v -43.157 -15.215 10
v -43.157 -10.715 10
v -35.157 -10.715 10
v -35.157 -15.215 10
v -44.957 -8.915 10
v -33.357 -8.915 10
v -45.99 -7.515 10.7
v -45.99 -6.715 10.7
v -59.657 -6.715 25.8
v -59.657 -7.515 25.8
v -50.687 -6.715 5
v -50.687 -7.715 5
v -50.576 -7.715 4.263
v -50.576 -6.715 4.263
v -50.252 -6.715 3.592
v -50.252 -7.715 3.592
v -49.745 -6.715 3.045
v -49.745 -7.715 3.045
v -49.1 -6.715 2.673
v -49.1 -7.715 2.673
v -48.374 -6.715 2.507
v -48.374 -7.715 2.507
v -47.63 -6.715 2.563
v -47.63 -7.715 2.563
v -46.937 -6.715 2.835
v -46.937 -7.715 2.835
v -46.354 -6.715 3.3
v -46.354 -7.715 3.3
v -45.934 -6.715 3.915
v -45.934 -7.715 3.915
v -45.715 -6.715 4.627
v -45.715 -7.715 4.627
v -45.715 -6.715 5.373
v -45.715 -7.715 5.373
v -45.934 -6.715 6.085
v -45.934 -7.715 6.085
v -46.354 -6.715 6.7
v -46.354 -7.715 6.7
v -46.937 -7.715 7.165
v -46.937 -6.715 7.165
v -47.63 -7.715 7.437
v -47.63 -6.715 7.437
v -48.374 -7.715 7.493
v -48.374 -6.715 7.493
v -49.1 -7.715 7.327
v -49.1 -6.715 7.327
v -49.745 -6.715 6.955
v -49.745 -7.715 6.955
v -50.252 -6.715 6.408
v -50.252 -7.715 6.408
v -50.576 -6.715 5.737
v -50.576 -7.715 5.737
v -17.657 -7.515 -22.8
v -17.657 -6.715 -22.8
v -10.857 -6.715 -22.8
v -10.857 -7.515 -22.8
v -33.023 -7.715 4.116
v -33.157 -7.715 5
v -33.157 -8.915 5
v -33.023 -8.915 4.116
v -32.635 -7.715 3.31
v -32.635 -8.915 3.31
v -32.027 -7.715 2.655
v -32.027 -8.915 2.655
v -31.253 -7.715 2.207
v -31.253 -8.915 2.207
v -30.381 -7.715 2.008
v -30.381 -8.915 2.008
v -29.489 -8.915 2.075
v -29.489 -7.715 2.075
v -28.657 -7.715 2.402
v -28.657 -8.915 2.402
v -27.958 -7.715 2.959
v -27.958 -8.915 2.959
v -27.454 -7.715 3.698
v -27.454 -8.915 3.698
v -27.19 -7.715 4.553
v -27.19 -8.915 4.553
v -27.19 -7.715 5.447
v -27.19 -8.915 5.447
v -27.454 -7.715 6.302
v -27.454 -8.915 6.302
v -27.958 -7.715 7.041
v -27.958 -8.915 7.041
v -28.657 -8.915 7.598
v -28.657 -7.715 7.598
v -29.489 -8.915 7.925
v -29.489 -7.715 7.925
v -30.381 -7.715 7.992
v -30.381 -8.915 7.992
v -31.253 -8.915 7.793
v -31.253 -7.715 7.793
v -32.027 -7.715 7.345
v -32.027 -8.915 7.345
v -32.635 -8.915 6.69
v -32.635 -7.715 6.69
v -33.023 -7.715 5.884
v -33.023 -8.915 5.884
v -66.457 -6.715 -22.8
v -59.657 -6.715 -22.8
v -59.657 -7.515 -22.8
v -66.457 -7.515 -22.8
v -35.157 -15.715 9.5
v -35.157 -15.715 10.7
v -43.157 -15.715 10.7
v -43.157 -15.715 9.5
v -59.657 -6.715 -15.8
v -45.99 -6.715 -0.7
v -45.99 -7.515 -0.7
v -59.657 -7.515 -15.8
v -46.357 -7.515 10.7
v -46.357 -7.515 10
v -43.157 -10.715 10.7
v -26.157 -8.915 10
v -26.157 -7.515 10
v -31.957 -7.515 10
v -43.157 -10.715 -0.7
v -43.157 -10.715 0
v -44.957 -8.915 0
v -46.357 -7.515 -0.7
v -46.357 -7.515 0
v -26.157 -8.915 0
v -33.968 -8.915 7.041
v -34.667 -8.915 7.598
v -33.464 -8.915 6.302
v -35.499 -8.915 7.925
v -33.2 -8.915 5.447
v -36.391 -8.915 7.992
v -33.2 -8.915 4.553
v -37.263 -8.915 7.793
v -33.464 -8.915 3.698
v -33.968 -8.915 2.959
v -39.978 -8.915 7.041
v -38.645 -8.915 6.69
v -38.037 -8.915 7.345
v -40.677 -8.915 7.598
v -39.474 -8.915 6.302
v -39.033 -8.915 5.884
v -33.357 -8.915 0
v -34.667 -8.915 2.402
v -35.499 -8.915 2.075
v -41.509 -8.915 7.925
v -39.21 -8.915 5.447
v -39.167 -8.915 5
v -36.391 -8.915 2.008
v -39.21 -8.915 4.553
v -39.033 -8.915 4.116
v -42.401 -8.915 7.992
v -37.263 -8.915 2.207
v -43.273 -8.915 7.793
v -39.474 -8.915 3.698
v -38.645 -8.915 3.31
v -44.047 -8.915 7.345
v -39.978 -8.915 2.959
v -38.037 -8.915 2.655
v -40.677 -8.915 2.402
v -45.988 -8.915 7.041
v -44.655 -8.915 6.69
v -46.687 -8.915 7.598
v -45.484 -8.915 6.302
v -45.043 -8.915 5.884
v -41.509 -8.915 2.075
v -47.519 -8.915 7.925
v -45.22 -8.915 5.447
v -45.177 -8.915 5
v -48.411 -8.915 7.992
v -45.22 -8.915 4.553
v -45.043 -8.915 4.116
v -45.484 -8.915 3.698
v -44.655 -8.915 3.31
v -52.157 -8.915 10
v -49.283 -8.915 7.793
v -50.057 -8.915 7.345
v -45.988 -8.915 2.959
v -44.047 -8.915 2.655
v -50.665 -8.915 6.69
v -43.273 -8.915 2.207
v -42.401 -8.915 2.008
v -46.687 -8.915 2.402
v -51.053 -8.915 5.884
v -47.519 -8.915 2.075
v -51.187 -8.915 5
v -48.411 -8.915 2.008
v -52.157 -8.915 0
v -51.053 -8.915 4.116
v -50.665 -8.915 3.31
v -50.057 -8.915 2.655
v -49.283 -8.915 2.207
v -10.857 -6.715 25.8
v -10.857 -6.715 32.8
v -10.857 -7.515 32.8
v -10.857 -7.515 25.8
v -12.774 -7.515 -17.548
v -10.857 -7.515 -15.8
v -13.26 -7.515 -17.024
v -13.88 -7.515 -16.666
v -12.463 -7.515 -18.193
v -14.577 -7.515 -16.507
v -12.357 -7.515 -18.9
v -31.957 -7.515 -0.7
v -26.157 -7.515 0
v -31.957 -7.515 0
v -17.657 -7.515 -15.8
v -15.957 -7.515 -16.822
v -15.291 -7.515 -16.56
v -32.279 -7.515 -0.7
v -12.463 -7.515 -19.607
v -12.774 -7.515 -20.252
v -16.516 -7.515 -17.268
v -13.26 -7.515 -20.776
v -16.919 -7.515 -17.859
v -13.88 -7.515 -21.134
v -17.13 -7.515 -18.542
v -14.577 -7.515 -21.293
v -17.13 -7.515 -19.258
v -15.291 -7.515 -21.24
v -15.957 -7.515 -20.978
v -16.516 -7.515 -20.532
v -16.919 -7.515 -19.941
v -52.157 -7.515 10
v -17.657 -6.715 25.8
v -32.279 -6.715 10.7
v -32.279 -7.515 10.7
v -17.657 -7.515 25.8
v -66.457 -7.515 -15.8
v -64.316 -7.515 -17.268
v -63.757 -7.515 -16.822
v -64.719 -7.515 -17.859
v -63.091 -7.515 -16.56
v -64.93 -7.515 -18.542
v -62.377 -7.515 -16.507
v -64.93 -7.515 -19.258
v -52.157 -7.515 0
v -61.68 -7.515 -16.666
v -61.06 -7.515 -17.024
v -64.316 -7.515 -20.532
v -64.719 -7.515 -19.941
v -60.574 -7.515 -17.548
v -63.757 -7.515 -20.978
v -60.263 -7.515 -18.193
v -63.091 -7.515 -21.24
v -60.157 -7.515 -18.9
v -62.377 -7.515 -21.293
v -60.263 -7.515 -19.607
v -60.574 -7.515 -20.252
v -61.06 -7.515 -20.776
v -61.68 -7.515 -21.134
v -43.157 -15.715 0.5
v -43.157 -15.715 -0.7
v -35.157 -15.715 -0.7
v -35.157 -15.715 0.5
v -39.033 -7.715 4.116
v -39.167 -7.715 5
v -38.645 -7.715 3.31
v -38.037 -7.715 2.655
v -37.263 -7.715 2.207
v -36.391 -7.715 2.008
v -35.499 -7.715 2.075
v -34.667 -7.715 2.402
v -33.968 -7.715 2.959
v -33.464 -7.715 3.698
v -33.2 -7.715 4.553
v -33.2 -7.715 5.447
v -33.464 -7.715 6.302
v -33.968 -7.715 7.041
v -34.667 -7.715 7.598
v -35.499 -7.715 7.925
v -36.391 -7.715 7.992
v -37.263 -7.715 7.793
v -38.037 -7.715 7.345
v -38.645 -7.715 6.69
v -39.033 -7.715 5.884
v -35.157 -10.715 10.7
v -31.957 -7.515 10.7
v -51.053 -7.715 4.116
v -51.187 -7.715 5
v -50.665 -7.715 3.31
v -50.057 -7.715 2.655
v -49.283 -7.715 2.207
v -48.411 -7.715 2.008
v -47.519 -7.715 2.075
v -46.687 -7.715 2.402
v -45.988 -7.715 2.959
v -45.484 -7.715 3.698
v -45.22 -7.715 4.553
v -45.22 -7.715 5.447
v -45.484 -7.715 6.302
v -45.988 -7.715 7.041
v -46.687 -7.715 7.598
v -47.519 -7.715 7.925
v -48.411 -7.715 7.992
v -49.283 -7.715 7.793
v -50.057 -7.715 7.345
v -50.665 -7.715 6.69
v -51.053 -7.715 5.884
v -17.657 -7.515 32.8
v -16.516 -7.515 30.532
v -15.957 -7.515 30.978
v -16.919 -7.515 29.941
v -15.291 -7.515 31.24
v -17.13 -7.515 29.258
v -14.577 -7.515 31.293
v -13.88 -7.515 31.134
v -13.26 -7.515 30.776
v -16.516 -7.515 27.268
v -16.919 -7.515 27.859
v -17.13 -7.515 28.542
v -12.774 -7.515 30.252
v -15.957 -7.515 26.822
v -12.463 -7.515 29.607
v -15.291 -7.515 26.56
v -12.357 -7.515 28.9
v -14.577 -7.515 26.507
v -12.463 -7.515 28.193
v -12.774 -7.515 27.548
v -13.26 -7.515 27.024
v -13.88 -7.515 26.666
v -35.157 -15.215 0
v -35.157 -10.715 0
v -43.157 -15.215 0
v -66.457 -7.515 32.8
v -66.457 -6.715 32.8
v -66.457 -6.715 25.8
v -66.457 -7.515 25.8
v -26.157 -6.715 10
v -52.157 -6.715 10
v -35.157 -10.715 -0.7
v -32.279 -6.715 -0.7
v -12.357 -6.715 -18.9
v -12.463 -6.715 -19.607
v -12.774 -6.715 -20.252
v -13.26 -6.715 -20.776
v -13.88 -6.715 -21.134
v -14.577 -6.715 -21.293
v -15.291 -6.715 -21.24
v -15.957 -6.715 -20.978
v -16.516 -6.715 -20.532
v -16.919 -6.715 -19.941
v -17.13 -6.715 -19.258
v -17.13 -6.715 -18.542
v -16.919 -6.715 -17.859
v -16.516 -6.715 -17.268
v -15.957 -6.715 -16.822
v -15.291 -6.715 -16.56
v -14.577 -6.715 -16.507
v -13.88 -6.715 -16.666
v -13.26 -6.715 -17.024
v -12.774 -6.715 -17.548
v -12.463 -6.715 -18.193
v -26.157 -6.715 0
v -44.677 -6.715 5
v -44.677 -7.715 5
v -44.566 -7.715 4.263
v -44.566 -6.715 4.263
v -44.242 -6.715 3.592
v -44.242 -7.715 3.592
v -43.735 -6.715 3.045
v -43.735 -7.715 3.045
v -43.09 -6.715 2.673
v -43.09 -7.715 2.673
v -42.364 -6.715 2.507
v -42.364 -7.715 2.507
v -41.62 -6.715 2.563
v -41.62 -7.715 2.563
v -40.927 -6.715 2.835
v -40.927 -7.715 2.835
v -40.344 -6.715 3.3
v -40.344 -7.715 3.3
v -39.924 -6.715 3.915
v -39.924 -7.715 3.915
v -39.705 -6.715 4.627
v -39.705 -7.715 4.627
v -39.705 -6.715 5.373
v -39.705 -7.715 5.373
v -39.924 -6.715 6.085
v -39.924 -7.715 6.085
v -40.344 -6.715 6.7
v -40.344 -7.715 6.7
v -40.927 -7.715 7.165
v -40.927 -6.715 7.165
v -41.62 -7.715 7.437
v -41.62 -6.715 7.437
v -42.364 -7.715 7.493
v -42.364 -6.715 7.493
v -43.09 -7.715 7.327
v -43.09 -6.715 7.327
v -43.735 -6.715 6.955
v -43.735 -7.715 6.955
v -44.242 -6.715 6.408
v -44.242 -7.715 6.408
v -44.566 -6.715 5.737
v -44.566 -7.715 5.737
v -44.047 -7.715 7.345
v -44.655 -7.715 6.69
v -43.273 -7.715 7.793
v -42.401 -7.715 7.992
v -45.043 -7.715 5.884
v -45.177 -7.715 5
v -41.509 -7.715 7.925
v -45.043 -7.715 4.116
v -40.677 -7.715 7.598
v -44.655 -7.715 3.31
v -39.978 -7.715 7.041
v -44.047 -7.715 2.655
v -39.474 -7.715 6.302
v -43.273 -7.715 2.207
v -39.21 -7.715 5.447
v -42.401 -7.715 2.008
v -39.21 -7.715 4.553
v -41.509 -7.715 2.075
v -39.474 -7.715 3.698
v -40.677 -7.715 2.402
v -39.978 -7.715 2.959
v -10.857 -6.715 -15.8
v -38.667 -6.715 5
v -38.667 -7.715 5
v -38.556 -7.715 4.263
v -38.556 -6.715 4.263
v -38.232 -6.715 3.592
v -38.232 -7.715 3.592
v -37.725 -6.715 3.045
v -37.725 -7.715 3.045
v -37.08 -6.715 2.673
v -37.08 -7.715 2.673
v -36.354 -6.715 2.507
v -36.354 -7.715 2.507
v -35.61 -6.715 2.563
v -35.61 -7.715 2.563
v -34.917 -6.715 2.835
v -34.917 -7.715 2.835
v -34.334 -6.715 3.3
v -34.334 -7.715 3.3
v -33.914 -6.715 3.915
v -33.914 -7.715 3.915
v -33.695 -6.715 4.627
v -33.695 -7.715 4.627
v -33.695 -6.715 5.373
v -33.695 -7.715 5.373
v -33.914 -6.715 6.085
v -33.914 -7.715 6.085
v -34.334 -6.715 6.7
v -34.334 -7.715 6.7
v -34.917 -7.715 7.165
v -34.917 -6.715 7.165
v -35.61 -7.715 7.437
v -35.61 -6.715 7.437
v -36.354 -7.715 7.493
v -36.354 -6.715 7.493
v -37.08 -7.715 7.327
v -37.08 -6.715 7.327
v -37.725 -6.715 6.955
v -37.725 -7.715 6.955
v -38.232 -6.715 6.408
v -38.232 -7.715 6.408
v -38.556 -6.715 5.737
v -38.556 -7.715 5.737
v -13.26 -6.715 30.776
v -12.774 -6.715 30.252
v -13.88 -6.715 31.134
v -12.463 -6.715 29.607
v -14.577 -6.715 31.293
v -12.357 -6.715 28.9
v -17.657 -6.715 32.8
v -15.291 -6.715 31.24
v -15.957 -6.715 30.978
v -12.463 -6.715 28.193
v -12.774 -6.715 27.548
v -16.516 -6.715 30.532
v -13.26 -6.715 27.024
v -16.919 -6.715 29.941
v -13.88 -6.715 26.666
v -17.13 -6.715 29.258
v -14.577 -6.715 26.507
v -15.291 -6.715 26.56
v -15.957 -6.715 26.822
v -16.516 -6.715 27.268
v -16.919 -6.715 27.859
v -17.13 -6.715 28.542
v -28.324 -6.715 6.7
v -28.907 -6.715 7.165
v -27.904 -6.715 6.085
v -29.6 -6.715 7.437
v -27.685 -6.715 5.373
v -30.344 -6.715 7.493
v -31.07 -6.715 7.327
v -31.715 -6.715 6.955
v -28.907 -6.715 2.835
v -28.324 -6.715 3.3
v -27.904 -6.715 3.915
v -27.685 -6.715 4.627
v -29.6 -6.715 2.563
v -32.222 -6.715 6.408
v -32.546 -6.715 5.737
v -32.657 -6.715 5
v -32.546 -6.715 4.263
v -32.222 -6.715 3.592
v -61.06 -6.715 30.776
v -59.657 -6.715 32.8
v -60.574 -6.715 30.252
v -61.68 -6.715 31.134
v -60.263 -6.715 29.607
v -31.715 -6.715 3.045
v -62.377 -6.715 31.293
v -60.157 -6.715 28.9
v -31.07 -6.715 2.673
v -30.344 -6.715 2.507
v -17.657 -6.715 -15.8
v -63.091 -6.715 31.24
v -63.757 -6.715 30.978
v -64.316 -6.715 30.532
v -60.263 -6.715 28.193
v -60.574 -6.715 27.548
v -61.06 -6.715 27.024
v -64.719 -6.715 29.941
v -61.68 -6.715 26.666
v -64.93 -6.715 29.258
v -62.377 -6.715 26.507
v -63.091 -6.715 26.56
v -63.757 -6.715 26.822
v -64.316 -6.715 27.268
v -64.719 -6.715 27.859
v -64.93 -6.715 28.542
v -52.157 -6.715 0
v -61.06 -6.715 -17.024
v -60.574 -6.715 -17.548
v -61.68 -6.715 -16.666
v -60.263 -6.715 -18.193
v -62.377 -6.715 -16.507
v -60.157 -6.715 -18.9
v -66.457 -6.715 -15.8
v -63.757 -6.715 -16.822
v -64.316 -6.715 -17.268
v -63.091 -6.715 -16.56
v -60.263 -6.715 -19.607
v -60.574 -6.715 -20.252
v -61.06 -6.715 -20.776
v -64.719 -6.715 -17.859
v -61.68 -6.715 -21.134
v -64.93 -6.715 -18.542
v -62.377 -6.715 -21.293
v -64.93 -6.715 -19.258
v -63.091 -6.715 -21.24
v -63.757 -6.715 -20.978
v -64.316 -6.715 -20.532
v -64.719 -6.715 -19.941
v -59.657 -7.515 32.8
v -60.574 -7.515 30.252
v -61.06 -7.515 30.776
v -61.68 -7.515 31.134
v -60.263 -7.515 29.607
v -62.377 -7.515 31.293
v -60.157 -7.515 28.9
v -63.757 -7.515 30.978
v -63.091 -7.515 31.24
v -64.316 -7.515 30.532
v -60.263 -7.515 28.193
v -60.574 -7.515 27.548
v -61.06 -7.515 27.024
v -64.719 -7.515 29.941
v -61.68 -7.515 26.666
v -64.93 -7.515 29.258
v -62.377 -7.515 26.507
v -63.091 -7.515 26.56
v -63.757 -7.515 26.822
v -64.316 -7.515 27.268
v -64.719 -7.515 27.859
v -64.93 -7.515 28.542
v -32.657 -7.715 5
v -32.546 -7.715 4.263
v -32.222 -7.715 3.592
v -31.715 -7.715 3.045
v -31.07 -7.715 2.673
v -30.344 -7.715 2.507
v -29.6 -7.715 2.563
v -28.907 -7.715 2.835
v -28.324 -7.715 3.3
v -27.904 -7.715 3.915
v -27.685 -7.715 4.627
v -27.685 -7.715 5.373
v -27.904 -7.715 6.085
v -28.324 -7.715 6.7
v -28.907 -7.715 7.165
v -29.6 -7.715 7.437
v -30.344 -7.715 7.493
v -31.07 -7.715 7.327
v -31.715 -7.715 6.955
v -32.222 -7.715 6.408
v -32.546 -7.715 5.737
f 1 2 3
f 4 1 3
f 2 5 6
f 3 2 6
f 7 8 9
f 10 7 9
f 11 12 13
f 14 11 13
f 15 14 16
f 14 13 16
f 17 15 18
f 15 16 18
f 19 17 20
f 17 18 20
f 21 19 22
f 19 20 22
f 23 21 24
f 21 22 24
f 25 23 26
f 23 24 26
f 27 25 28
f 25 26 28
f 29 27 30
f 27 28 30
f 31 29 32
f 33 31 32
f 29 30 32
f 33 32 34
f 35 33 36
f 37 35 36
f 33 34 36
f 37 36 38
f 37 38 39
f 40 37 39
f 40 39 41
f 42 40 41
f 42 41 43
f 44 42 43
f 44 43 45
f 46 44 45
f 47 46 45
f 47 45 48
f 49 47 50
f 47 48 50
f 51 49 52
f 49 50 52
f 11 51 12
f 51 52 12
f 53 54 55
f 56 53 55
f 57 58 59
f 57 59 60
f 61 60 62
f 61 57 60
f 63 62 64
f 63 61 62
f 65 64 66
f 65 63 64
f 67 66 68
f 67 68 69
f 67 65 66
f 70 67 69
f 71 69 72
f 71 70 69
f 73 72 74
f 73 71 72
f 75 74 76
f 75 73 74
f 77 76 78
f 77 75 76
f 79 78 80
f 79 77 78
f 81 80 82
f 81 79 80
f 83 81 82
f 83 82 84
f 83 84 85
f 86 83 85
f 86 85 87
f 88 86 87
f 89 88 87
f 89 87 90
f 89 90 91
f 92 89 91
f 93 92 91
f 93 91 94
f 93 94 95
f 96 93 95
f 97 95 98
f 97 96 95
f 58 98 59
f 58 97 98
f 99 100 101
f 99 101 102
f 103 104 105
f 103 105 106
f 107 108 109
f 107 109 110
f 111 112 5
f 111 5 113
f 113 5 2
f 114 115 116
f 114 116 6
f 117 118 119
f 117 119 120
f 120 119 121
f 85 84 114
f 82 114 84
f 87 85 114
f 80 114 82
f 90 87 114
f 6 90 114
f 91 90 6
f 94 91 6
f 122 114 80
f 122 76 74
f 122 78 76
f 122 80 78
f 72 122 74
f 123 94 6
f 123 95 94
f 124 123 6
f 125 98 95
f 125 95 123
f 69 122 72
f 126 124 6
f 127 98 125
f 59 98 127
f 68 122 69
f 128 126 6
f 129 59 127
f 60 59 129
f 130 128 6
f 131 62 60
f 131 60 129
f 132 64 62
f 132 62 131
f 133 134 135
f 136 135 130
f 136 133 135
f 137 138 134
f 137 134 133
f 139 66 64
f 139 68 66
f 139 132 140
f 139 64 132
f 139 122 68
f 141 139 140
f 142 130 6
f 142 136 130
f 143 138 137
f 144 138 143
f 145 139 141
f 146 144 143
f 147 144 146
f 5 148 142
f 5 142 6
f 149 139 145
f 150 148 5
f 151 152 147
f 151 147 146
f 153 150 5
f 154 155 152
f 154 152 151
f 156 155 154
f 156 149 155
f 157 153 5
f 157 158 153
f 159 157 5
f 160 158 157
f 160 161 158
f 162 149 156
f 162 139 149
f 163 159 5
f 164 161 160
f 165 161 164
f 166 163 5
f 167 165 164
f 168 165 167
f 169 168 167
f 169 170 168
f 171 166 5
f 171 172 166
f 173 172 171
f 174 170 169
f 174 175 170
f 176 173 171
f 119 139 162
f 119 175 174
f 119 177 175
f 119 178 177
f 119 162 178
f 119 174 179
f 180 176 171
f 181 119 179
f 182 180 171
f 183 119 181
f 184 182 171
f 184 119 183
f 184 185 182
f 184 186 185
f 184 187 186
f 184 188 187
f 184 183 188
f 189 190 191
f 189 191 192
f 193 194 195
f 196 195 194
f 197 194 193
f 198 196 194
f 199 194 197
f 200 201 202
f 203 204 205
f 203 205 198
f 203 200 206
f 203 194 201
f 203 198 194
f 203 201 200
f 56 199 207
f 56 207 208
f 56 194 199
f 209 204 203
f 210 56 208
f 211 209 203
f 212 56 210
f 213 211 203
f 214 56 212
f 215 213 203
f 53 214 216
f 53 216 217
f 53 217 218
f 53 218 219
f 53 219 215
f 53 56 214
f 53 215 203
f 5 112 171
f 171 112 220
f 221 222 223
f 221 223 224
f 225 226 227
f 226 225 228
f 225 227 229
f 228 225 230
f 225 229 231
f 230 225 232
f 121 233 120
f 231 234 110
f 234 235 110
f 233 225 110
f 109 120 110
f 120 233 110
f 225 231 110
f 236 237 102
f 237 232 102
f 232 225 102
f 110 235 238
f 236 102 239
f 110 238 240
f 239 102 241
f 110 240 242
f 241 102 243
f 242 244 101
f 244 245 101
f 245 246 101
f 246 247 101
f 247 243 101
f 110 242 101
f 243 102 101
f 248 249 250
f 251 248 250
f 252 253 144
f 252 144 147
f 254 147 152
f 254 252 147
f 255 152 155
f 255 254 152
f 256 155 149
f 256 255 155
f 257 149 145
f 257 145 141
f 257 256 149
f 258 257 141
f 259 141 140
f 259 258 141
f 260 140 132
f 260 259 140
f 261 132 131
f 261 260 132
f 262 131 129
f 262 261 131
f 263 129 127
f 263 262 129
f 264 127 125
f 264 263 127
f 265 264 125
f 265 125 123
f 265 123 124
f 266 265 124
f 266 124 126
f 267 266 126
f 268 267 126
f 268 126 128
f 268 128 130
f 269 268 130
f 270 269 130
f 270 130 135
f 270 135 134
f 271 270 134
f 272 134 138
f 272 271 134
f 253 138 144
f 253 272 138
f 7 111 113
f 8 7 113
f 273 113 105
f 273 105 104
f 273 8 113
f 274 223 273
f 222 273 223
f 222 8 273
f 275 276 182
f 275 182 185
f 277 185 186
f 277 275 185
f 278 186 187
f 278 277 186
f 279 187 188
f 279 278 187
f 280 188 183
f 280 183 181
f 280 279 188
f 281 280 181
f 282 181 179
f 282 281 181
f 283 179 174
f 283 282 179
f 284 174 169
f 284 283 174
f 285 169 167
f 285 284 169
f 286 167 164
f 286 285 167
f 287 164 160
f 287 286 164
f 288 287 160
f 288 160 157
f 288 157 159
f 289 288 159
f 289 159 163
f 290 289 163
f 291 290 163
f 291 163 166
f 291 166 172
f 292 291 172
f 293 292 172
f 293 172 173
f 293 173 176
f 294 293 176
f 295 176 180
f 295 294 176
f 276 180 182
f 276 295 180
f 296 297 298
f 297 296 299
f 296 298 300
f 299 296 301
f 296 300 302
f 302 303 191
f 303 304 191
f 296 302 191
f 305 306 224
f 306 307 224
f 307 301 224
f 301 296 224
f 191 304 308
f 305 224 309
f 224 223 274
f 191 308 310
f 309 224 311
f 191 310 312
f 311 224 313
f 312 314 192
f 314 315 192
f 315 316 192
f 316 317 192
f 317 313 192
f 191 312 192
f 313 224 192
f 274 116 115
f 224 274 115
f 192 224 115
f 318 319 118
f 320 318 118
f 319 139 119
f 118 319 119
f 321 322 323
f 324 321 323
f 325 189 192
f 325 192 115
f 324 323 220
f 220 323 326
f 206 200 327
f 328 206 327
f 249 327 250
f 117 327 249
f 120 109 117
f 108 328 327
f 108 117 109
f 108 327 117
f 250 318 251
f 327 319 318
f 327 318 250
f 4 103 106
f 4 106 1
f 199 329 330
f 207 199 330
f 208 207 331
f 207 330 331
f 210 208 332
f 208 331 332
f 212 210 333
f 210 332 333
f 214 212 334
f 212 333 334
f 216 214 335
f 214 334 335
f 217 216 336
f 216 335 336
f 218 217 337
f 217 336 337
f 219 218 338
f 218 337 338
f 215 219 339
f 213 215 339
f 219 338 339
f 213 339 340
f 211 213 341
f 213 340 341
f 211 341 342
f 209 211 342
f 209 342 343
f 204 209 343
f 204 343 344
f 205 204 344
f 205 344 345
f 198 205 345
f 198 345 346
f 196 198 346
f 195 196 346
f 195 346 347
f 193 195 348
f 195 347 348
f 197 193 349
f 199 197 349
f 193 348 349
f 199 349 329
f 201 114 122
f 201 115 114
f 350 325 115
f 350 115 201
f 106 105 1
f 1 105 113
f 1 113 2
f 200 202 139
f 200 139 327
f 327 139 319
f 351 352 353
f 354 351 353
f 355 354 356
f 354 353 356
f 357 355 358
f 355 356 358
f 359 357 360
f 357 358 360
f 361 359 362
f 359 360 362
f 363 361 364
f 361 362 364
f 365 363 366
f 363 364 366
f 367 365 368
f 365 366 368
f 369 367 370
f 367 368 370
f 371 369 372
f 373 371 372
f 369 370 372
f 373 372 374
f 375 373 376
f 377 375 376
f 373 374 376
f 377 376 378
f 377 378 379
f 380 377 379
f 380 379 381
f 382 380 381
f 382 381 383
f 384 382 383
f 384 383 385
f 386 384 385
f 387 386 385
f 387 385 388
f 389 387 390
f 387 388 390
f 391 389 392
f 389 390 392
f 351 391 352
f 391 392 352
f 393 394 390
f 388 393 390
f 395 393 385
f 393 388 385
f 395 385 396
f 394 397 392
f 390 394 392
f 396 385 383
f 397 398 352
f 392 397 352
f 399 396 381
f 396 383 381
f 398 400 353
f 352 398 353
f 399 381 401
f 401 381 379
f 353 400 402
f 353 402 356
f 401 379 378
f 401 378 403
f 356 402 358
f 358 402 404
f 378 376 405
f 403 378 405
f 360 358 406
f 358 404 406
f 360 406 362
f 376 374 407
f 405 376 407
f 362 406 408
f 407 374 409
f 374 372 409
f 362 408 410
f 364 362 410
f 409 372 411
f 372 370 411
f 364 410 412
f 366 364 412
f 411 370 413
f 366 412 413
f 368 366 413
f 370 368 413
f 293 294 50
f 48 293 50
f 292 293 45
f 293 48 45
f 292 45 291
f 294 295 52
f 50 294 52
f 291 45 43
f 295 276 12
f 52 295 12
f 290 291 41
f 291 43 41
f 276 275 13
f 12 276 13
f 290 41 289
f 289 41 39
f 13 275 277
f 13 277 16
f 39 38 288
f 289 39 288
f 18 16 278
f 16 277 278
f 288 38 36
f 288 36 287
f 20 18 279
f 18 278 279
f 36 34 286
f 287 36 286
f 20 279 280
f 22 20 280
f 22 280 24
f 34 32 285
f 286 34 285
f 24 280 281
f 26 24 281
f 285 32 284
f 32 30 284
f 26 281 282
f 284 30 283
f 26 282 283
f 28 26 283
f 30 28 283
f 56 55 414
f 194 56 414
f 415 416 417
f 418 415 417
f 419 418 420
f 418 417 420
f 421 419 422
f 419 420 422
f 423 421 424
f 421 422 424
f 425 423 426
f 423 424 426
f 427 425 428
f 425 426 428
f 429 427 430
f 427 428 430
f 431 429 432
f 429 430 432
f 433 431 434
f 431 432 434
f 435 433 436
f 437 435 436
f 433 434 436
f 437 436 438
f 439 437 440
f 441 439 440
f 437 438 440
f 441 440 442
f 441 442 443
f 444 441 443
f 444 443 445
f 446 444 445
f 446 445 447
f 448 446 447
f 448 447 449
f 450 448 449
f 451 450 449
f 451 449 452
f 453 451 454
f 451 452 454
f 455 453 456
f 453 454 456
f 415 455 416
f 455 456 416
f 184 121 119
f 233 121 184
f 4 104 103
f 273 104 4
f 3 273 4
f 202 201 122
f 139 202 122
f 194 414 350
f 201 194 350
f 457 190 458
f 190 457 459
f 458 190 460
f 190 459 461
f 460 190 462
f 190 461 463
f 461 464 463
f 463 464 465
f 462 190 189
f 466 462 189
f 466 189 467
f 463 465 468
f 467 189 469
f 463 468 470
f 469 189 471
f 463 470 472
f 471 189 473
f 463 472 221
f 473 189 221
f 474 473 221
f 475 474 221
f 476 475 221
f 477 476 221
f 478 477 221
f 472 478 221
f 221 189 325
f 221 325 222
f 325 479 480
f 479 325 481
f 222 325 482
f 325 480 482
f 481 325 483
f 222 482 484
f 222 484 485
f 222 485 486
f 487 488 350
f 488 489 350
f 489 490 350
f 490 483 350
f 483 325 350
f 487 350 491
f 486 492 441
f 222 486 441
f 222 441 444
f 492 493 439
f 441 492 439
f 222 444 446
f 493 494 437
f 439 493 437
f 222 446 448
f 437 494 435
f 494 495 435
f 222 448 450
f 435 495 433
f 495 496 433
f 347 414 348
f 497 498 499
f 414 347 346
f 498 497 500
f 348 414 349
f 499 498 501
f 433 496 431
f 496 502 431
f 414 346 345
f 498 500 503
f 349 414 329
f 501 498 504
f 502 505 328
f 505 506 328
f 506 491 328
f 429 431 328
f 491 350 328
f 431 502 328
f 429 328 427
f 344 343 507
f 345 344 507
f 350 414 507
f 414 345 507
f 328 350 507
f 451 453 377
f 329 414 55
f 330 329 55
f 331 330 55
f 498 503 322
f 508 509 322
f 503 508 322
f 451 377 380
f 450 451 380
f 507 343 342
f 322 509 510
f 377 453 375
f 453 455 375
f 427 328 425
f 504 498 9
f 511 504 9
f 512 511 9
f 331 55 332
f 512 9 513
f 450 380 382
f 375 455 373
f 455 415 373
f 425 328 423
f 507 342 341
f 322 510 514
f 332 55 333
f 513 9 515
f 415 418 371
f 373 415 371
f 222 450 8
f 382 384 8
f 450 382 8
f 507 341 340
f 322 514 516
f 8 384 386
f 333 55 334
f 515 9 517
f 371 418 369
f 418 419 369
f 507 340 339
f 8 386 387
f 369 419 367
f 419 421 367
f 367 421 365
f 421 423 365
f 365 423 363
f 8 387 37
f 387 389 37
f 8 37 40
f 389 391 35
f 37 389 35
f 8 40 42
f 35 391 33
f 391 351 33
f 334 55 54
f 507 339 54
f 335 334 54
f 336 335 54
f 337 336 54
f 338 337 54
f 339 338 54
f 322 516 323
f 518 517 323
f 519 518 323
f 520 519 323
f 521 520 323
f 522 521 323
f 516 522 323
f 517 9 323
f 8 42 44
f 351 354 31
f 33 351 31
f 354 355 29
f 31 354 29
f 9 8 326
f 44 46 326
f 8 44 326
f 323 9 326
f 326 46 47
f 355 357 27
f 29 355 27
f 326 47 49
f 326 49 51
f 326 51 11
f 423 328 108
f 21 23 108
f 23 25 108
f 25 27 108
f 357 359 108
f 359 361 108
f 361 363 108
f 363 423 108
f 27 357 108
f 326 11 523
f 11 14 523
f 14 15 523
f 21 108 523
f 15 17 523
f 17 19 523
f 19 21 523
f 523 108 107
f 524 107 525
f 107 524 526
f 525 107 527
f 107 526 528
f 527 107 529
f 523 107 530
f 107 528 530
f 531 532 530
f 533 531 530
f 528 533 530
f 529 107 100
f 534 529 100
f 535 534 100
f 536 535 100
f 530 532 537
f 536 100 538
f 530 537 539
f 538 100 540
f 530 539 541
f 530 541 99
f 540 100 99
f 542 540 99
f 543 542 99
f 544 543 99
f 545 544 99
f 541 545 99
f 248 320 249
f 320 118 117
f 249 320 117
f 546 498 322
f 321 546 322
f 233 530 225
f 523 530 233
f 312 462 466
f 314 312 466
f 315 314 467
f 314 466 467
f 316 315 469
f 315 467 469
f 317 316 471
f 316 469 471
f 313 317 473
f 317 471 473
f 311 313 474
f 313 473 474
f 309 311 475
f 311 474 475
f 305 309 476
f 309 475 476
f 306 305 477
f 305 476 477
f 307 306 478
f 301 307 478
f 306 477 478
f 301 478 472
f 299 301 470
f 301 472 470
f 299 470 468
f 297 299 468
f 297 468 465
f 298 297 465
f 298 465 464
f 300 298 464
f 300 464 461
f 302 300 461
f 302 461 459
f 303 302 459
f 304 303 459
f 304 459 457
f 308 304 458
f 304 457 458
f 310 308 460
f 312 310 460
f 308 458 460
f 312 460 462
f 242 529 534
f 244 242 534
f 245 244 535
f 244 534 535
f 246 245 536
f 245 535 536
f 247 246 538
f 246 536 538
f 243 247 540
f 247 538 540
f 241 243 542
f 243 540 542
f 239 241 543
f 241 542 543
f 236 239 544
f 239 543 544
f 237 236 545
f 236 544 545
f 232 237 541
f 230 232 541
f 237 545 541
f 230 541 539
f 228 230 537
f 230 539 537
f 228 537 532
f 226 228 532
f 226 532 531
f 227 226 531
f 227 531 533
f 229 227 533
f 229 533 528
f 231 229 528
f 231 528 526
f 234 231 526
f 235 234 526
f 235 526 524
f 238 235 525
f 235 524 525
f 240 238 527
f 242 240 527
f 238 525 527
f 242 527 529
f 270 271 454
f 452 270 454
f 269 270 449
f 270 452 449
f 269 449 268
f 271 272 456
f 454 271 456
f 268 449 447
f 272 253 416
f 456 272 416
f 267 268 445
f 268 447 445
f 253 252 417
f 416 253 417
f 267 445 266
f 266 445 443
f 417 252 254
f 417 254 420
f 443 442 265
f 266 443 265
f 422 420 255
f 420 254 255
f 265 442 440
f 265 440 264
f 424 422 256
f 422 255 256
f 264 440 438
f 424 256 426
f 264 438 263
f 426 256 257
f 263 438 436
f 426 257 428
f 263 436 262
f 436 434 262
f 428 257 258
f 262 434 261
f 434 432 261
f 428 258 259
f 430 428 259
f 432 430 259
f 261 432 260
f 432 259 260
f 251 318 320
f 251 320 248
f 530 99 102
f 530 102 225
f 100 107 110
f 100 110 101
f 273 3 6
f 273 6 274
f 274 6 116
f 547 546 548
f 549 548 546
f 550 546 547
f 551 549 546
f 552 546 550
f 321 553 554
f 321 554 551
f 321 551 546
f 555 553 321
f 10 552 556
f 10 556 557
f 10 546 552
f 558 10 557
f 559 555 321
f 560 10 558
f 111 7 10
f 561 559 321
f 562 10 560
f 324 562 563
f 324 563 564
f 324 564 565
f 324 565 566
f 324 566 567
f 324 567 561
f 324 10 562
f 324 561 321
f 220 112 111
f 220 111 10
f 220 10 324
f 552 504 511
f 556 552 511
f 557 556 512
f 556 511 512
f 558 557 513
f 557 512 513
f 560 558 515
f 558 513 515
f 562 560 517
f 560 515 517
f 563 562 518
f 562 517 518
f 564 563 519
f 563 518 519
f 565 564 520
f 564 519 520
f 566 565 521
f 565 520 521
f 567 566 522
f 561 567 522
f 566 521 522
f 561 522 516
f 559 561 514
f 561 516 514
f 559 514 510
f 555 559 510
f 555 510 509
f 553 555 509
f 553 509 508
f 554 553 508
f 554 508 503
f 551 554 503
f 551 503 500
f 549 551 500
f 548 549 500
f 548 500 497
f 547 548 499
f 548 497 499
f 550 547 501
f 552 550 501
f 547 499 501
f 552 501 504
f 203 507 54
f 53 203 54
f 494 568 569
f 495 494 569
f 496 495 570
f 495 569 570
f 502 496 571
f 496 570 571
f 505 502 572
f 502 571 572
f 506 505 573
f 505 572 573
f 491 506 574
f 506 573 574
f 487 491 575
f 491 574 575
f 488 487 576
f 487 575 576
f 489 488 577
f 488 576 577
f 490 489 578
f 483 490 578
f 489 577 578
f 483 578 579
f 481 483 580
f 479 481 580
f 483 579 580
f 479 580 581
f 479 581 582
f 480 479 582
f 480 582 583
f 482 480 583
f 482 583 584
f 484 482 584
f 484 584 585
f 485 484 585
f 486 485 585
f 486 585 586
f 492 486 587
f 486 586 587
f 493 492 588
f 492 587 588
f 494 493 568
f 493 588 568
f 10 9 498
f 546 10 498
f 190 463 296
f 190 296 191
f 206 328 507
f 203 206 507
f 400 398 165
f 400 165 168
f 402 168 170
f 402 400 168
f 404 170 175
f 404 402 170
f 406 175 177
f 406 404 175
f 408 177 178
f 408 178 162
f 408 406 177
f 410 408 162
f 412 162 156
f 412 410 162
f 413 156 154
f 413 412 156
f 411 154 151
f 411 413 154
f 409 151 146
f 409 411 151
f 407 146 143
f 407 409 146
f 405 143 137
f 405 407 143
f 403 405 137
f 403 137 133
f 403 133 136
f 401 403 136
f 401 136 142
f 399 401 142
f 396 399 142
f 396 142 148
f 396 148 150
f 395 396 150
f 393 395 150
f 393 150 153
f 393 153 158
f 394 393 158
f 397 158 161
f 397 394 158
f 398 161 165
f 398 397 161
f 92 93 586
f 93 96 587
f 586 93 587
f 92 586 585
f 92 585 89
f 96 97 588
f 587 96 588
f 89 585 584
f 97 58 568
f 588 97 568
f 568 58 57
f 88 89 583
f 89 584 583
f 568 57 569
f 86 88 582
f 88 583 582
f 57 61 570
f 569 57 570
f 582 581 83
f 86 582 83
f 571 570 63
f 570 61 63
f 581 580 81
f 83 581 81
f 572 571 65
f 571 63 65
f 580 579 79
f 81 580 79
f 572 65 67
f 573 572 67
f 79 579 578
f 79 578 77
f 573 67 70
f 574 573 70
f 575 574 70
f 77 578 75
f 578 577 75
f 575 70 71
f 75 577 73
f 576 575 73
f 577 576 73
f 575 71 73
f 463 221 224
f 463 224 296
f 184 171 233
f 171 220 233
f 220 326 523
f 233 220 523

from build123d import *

# Parameters (mm, degrees)
SKICA1_W                 = 26
SKICA1_H                 = 1
P_IDAT_VYSUNUT_M1_DEPTH  = 10
SKICA2_R                 = 2.5
ODEBRAT_VYSUNUT_M1_DEPTH = 1
SKICA3_R                 = 2.4
P_IDAT_VYSUNUT_M2_DEPTH  = 0.8
SKICA4_W                 = 26
SKICA4_H                 = 10
SKICA4_R                 = 3
P_IDAT_VYSUNUT_M3_DEPTH  = 1.2
SKICA6_W                 = 8
SKICA6_H                 = 0.7
P_IDAT_VYSUNUT_M5_DEPTH  = 9
P_IDAT_VYSUNUT_M6_DEPTH  = 8
P_IDAT_VYSUNUT_M8_DEPTH  = 0.7
P_IDAT_VYSUNUT_M9_DEPTH  = 0.7


with BuildPart() as part:
    # Skica1 → Přidat vysunutím1 (new body)
    with BuildSketch(Plane.XY):
        with Locations((-39.156744291, -7.214704976)):
            Rectangle(SKICA1_W, SKICA1_H)
    extrude(amount=P_IDAT_VYSUNUT_M1_DEPTH)

    # Skica2 → Odebrat vysunutím1 (cut)
    with BuildSketch(Plane(origin=(0, -7.714704976, 0), x_dir=(-1, 0, 0), z_dir=(0, -1, 0))):
        with Locations((48.186744291, -5)):
            Circle(SKICA2_R)
        with Locations((42.176744291, -5)):
            Circle(SKICA2_R)
        with Locations((36.166744291, -5)):
            Circle(SKICA2_R)
        with Locations((30.156744291, -5)):
            Circle(SKICA2_R)
    extrude(amount=-ODEBRAT_VYSUNUT_M1_DEPTH, mode=Mode.SUBTRACT)

    # Skica3 → Přidat vysunutím2 (add)
    with BuildSketch(Plane(origin=(0, -6.714704976, 0), x_dir=(1, 0, 0), z_dir=(0, 1, 0))):
        Polygon((-32.956744291, 0), (-17.656744291, 15.8), (-17.656744291, 22.8), (-10.856744291, 22.8), (-10.856744291, 15.8), (-26.156744291, 0), align=None)
        with Locations((-14.756744291, 18.9)):
            Circle(SKICA3_R, mode=Mode.SUBTRACT)
        Polygon((-52.156744291, 0), (-45.356744291, 0), (-59.656744291, 15.8), (-59.656744291, 22.8), (-66.456744291, 22.8), (-66.456744291, 15.8), align=None)
        with Locations((-62.556744291, 18.9)):
            Circle(SKICA3_R, mode=Mode.SUBTRACT)
        Polygon((-45.356744291, -10), (-59.656744291, -25.8), (-59.656744291, -32.8), (-66.456744291, -32.8), (-66.456744291, -25.8), (-52.156744291, -10), align=None)
        with Locations((-62.556744291, -28.9)):
            Circle(SKICA3_R, mode=Mode.SUBTRACT)
        Polygon((-26.156744291, -10), (-32.956744291, -10), (-17.656744291, -25.8), (-17.656744291, -32.8), (-10.856744291, -32.8), (-10.856744291, -25.8), align=None)
        with Locations((-14.756744291, -28.9)):
            Circle(SKICA3_R, mode=Mode.SUBTRACT)
    extrude(amount=-P_IDAT_VYSUNUT_M2_DEPTH)

    # Skica4 → Přidat vysunutím3 (add)
    with BuildSketch(Plane(origin=(0, -7.714704976, 0), x_dir=(-1, 0, 0), z_dir=(0, -1, 0))):
        with Locations((39.156744291, -5)):
            Rectangle(SKICA4_W, SKICA4_H)
        with Locations((48.186744291, -5)):
            Circle(SKICA4_R, mode=Mode.SUBTRACT)
        with Locations((42.176744291, -5)):
            Circle(SKICA4_R, mode=Mode.SUBTRACT)
        with Locations((36.166744291, -5)):
            Circle(SKICA4_R, mode=Mode.SUBTRACT)
        with Locations((30.156744291, -5)):
            Circle(SKICA4_R, mode=Mode.SUBTRACT)
    extrude(amount=P_IDAT_VYSUNUT_M3_DEPTH)

    # Skica6 → Přidat vysunutím5 (add)
    with BuildSketch(Plane(origin=(0, -6.714704976, 0), x_dir=(1, 0, 0), z_dir=(0, 1, 0))):
        with Locations((-39.156744291, 0.35)):
            Rectangle(SKICA6_W, SKICA6_H)
        with Locations((-39.156744291, -10.35)):
            Rectangle(SKICA6_W, SKICA6_H)
    extrude(amount=-P_IDAT_VYSUNUT_M5_DEPTH)

    # Skica7 → Přidat vysunutím6 (add)
    with BuildSketch(Plane(origin=(-35.156744291, 0, 0), x_dir=(0, 0, -1), z_dir=(1, 0, 0))):
        Polygon((-10, -15.714704976), (-9.5, -15.714704976), (-10, -15.214704976), align=None)
        Polygon((0, -15.714704976), (0, -15.214704976), (-0.5, -15.714704976), align=None)
    extrude(amount=-P_IDAT_VYSUNUT_M6_DEPTH)

    # Skica8 → Přidat vysunutím8 (add)
    with BuildSketch(Plane(origin=(0, 0, 0), x_dir=(-1, 0, 0), z_dir=(0, 0, -1))):
        Polygon((43.156744291, -6.714704976), (43.156744291, -10.714704976), (47.156744291, -6.714704976), align=None)
        Polygon((35.156744291, -10.714704976), (35.156744291, -6.714704976), (31.156744291, -6.714704976), align=None)
    extrude(amount=P_IDAT_VYSUNUT_M8_DEPTH)

    # Skica9 → Přidat vysunutím9 (add)
    with BuildSketch(Plane.XY.offset(10)):
        Polygon((-43.156744291, -6.714704976), (-47.156744291, -6.714704976), (-43.156744291, -10.714704976), align=None)
        Polygon((-35.156744291, -6.714704976), (-35.156744291, -10.714704976), (-31.156744291, -6.714704976), align=None)
    extrude(amount=P_IDAT_VYSUNUT_M9_DEPTH)


solid = part.part
